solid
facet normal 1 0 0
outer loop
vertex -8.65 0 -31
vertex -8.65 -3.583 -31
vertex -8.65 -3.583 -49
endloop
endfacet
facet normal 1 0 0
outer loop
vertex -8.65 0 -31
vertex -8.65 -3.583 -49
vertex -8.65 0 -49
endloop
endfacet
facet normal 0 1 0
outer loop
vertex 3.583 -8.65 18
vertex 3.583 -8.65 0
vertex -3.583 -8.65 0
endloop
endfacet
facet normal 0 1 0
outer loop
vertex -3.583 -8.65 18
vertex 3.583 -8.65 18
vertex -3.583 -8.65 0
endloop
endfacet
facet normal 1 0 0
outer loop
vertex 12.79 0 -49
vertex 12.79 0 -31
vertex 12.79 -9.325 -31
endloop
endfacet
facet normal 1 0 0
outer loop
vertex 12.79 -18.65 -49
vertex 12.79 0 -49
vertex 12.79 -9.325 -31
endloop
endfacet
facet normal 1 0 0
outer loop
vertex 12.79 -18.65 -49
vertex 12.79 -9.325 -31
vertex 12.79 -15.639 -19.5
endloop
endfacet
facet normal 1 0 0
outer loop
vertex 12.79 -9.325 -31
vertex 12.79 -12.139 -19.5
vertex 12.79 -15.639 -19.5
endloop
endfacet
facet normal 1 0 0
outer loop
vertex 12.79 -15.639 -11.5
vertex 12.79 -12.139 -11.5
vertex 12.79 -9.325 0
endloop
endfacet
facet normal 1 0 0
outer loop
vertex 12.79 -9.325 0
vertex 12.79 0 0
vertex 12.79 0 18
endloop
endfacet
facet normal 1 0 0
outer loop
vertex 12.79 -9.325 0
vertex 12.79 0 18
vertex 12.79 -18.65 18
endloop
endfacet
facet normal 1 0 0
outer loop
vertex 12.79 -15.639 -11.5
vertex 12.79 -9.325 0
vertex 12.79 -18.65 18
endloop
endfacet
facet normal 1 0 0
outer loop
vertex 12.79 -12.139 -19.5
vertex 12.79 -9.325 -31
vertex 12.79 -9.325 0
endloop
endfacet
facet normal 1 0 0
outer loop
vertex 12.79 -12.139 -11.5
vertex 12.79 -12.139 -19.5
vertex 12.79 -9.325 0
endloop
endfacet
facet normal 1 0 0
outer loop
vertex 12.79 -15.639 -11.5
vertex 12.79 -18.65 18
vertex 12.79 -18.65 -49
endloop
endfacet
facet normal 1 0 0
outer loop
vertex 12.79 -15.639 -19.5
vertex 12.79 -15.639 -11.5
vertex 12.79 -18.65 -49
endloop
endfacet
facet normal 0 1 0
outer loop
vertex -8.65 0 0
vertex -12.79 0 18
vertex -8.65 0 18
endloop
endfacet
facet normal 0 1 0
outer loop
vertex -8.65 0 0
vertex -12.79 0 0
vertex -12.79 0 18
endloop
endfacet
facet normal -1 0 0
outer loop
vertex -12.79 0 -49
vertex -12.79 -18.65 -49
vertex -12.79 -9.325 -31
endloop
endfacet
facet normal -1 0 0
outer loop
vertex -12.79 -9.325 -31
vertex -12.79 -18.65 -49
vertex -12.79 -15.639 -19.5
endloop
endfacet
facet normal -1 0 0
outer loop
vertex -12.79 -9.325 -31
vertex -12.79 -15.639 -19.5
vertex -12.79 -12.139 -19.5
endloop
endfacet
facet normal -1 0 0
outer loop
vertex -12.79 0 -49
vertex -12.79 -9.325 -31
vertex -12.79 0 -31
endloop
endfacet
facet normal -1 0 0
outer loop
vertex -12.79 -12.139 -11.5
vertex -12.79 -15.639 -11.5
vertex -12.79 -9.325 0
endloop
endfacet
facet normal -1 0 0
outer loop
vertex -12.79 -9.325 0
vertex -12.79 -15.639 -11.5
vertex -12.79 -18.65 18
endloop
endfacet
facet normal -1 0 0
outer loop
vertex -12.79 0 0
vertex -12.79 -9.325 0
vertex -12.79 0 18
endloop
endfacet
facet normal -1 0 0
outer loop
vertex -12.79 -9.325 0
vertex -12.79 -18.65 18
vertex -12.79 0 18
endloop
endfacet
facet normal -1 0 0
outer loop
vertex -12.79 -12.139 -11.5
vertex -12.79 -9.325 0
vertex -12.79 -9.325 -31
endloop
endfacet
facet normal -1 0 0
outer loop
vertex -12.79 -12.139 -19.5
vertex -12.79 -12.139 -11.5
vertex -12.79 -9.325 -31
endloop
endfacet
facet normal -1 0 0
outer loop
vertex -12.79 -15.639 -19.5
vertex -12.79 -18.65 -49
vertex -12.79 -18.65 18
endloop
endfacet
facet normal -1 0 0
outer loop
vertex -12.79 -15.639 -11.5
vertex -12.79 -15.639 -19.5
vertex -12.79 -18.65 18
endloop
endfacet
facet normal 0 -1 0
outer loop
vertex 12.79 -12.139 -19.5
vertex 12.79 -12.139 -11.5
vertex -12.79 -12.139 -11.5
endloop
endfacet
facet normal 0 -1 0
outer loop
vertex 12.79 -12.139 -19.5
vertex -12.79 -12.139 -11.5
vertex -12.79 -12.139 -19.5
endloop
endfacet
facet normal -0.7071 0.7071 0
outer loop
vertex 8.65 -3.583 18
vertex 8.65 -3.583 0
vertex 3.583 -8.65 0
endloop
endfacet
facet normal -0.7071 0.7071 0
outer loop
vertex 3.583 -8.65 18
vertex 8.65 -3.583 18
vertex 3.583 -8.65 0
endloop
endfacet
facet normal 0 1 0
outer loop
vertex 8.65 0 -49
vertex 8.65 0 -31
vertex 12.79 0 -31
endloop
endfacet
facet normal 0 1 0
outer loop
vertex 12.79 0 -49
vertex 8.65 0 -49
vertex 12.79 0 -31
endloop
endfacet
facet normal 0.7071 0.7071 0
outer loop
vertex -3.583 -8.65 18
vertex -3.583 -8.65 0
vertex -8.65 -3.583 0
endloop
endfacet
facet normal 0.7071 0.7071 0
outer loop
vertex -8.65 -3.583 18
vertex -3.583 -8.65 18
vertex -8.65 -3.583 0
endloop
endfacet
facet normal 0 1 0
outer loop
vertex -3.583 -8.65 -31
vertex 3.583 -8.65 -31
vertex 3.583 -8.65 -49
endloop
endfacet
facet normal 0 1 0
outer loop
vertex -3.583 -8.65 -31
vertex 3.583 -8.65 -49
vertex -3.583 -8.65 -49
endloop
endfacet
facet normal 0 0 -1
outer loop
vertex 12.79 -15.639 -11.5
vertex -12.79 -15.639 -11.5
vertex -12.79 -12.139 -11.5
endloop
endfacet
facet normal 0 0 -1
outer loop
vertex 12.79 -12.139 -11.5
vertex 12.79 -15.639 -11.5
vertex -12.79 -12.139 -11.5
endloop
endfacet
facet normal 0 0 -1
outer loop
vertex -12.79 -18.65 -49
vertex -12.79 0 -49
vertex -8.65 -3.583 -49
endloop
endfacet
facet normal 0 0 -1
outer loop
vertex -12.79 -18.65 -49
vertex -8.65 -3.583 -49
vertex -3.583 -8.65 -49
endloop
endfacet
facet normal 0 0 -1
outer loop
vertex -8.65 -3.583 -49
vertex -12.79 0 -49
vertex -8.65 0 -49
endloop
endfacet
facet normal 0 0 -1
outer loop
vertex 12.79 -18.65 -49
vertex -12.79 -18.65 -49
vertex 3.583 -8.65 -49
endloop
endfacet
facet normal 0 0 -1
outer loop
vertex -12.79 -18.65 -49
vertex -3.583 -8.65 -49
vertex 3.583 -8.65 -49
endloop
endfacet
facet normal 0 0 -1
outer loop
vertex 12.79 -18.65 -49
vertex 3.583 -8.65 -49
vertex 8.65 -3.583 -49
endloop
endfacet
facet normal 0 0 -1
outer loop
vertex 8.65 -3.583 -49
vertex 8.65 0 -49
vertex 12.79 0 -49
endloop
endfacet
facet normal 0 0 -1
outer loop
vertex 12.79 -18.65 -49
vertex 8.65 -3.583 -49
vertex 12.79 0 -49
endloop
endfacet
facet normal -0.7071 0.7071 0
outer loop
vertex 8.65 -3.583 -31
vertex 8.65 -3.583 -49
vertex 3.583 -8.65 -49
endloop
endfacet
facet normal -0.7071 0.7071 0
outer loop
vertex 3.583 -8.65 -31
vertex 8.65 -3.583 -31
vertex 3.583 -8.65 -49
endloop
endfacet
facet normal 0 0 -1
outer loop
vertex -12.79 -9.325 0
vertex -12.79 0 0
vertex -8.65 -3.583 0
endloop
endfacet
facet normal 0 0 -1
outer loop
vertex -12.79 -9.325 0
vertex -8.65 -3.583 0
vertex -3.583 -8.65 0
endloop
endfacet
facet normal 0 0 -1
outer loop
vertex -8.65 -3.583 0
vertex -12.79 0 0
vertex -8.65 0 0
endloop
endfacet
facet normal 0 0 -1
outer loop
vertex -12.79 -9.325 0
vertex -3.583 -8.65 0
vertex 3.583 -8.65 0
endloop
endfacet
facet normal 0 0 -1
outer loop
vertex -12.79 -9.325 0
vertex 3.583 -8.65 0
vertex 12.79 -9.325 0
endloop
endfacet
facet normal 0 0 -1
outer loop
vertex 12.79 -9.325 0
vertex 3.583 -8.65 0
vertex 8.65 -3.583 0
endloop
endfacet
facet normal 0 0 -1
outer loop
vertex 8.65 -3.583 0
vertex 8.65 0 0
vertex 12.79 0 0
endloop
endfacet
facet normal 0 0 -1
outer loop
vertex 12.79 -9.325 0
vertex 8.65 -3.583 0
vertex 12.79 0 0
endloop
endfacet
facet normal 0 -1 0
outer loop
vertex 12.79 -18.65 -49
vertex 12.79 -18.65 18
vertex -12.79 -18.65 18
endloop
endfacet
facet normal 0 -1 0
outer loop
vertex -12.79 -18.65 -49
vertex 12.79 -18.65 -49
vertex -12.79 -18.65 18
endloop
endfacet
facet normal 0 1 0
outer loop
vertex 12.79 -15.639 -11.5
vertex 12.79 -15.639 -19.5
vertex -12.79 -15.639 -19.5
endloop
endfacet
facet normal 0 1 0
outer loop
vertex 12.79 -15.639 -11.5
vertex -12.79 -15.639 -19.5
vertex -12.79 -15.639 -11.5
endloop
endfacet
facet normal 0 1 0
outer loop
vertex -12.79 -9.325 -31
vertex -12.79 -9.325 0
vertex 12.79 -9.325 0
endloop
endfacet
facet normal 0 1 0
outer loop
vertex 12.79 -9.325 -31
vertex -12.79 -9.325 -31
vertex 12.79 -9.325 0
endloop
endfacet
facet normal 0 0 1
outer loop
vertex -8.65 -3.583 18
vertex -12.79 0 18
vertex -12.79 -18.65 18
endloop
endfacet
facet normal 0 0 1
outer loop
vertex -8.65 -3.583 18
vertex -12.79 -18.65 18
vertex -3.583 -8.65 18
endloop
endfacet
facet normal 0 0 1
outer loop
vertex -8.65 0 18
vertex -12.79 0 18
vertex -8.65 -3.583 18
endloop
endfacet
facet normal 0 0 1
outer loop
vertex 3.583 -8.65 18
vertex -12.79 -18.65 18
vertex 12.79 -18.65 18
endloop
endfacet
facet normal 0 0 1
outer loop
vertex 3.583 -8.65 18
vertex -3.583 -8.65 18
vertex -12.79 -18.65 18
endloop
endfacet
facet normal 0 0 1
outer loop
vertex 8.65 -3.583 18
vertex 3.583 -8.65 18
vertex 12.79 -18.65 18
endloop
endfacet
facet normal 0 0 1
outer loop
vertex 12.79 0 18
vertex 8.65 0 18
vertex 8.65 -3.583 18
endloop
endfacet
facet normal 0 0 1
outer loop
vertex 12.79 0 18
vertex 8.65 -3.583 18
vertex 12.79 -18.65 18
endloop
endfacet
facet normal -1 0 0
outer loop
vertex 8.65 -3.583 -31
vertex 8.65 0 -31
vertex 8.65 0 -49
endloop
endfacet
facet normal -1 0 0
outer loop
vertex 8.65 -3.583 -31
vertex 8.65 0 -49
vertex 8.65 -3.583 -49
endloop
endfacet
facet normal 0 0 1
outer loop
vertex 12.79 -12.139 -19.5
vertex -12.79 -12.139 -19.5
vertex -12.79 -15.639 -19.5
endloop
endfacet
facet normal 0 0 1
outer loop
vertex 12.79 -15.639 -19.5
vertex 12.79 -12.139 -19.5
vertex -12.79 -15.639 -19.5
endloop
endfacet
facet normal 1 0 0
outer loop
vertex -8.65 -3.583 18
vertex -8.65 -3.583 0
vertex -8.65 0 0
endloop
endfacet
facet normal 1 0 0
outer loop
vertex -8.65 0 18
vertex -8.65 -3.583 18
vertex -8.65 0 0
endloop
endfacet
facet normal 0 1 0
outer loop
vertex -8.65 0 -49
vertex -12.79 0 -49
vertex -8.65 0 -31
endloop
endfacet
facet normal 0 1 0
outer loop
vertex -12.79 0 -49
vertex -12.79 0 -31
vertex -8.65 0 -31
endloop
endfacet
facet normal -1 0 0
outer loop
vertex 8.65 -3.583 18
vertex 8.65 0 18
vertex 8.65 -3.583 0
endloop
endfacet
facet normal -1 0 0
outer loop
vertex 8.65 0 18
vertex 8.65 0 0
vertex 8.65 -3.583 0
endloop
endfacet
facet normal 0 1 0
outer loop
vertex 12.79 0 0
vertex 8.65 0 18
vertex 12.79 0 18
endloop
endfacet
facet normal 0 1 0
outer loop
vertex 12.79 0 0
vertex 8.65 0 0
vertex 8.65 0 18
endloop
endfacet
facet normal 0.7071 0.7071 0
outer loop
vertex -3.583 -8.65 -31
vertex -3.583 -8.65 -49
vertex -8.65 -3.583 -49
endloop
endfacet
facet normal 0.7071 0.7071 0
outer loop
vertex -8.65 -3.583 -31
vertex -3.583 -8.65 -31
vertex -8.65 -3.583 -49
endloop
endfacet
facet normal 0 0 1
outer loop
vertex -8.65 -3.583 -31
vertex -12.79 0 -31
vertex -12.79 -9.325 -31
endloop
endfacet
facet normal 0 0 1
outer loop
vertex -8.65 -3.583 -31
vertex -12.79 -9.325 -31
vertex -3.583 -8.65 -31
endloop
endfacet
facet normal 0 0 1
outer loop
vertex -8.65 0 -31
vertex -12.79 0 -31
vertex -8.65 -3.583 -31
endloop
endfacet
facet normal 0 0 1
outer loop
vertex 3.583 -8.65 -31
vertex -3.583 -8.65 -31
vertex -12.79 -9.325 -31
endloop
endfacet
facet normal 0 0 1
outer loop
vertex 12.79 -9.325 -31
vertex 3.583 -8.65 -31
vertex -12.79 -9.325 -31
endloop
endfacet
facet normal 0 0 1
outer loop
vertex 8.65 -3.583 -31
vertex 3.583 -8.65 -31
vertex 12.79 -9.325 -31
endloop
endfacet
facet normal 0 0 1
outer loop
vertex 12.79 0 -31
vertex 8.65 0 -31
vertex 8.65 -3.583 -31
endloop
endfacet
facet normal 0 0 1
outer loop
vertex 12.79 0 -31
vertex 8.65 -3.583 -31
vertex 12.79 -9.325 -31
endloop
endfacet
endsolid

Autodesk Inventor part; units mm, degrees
ref_plane "YZ Plane" through (0, 0, 0) normal (1, 0, 0) x (0, 1, 0)
ref_plane "XZ Plane" through (0, 0, 0) normal (0, 1, 0) x (-1, 0, 0)
ref_plane "XY Plane" through (0, 0, 0) normal (0, 0, 1) x (1, 0, 0)
sketch "Sketch1" plane through (0, 0, 0) normal (0, 0, 1) x (1, 0, 0)
  line L0 (8.65, 3.5829) -> (8.65, -3.5829)
  line L1 (8.65, -3.5829) -> (3.5829, -8.65)
  line L2 (3.5829, -8.65) -> (-3.5829, -8.65)
  line L3 (-3.5829, -8.65) -> (-8.65, -3.5829)
  line L4 (-8.65, -3.5829) -> (-8.65, 3.5829)
  line L5 (-8.65, 3.5829) -> (-3.5829, 8.65)
  line L6 (-3.5829, 8.65) -> (3.5829, 8.65)
  line L7 (3.5829, 8.65) -> (8.65, 3.5829)
  line L8 (-12.7904, 0) -> (12.7904, 0)
  line L9 (12.7904, 0) -> (12.7904, -18.65)
  line L10 (12.7904, -18.65) -> (-12.7904, -18.65)
  line L11 (-12.7904, -18.65) -> (-12.7904, 0)
  point P0 (0, 0)
  point P1 (0, 0)
  point P2 (0, 0)
  point P3 (-8.65, 0)
  point P4 (8.65, 0)
  dimension "d0" = 17.3
  dimension "d1" = 10
extrude "Extrusion1" add sketch "Sketch1" along normal blind 18 contours L8 L9 L10 L11 L4 L3 L2 L1 L0
sketch "Sketch2" plane through (0, 0, 0) normal (0, 0, -1) x (-1, 0, 0)
  line L0 (-12.7904, -18.65) -> (-12.7904, 0) projected
  line L1 (12.7904, 0) -> (12.7904, -18.65) projected
  line L2 (-12.7904, -18.65) -> (12.7904, -18.65)
  line L3 (12.7904, -18.65) -> (12.7904, -9.275)
  line L4 (12.7904, -9.325) -> (-12.7904, -9.325)
  line L5 (-12.7904, -9.325) -> (-12.7904, -18.65)
  point P0 (0, 0)
  point P1 (-12.7904, -9.325)
extrude "Extrusion2" add sketch "Sketch2" along normal blind 31
extrude "Extrusion3" add sketch "Sketch1" against normal blind 18 from surface at -31 contours L8 L9 L10 L11 L4 L3 L2 L1 L0
sketch "Sketch3" plane through (12.7904, -18.65, 18) normal (1, 0, 0) x (0, 0, -1)
  line L0 (29.5, 6.5107) -> (37.5, 6.5107)
  line L1 (37.5, 6.5107) -> (37.5, 3.0107)
  line L2 (37.5, 3.0107) -> (29.5, 3.0107)
  line L3 (29.5, 3.0107) -> (29.5, 6.5107)
  line L4 (29.5, 6.5107) -> (37.5, 3.0107) construction
  line L5 (37.5, 6.5107) -> (29.5, 3.0107) construction
  line L6 (18, 9.325) -> (49, 9.325) projected
  point P0 (18, 18.65)
  point P1 (33.5, 4.7607)
  point P2 (33.5, 9.325)
  dimension "d8" = 3.5
  dimension "d9" = 8
extrude "Extrusion4" cut sketch "Sketch3" against normal through all
properties part number "Gage Stand"
